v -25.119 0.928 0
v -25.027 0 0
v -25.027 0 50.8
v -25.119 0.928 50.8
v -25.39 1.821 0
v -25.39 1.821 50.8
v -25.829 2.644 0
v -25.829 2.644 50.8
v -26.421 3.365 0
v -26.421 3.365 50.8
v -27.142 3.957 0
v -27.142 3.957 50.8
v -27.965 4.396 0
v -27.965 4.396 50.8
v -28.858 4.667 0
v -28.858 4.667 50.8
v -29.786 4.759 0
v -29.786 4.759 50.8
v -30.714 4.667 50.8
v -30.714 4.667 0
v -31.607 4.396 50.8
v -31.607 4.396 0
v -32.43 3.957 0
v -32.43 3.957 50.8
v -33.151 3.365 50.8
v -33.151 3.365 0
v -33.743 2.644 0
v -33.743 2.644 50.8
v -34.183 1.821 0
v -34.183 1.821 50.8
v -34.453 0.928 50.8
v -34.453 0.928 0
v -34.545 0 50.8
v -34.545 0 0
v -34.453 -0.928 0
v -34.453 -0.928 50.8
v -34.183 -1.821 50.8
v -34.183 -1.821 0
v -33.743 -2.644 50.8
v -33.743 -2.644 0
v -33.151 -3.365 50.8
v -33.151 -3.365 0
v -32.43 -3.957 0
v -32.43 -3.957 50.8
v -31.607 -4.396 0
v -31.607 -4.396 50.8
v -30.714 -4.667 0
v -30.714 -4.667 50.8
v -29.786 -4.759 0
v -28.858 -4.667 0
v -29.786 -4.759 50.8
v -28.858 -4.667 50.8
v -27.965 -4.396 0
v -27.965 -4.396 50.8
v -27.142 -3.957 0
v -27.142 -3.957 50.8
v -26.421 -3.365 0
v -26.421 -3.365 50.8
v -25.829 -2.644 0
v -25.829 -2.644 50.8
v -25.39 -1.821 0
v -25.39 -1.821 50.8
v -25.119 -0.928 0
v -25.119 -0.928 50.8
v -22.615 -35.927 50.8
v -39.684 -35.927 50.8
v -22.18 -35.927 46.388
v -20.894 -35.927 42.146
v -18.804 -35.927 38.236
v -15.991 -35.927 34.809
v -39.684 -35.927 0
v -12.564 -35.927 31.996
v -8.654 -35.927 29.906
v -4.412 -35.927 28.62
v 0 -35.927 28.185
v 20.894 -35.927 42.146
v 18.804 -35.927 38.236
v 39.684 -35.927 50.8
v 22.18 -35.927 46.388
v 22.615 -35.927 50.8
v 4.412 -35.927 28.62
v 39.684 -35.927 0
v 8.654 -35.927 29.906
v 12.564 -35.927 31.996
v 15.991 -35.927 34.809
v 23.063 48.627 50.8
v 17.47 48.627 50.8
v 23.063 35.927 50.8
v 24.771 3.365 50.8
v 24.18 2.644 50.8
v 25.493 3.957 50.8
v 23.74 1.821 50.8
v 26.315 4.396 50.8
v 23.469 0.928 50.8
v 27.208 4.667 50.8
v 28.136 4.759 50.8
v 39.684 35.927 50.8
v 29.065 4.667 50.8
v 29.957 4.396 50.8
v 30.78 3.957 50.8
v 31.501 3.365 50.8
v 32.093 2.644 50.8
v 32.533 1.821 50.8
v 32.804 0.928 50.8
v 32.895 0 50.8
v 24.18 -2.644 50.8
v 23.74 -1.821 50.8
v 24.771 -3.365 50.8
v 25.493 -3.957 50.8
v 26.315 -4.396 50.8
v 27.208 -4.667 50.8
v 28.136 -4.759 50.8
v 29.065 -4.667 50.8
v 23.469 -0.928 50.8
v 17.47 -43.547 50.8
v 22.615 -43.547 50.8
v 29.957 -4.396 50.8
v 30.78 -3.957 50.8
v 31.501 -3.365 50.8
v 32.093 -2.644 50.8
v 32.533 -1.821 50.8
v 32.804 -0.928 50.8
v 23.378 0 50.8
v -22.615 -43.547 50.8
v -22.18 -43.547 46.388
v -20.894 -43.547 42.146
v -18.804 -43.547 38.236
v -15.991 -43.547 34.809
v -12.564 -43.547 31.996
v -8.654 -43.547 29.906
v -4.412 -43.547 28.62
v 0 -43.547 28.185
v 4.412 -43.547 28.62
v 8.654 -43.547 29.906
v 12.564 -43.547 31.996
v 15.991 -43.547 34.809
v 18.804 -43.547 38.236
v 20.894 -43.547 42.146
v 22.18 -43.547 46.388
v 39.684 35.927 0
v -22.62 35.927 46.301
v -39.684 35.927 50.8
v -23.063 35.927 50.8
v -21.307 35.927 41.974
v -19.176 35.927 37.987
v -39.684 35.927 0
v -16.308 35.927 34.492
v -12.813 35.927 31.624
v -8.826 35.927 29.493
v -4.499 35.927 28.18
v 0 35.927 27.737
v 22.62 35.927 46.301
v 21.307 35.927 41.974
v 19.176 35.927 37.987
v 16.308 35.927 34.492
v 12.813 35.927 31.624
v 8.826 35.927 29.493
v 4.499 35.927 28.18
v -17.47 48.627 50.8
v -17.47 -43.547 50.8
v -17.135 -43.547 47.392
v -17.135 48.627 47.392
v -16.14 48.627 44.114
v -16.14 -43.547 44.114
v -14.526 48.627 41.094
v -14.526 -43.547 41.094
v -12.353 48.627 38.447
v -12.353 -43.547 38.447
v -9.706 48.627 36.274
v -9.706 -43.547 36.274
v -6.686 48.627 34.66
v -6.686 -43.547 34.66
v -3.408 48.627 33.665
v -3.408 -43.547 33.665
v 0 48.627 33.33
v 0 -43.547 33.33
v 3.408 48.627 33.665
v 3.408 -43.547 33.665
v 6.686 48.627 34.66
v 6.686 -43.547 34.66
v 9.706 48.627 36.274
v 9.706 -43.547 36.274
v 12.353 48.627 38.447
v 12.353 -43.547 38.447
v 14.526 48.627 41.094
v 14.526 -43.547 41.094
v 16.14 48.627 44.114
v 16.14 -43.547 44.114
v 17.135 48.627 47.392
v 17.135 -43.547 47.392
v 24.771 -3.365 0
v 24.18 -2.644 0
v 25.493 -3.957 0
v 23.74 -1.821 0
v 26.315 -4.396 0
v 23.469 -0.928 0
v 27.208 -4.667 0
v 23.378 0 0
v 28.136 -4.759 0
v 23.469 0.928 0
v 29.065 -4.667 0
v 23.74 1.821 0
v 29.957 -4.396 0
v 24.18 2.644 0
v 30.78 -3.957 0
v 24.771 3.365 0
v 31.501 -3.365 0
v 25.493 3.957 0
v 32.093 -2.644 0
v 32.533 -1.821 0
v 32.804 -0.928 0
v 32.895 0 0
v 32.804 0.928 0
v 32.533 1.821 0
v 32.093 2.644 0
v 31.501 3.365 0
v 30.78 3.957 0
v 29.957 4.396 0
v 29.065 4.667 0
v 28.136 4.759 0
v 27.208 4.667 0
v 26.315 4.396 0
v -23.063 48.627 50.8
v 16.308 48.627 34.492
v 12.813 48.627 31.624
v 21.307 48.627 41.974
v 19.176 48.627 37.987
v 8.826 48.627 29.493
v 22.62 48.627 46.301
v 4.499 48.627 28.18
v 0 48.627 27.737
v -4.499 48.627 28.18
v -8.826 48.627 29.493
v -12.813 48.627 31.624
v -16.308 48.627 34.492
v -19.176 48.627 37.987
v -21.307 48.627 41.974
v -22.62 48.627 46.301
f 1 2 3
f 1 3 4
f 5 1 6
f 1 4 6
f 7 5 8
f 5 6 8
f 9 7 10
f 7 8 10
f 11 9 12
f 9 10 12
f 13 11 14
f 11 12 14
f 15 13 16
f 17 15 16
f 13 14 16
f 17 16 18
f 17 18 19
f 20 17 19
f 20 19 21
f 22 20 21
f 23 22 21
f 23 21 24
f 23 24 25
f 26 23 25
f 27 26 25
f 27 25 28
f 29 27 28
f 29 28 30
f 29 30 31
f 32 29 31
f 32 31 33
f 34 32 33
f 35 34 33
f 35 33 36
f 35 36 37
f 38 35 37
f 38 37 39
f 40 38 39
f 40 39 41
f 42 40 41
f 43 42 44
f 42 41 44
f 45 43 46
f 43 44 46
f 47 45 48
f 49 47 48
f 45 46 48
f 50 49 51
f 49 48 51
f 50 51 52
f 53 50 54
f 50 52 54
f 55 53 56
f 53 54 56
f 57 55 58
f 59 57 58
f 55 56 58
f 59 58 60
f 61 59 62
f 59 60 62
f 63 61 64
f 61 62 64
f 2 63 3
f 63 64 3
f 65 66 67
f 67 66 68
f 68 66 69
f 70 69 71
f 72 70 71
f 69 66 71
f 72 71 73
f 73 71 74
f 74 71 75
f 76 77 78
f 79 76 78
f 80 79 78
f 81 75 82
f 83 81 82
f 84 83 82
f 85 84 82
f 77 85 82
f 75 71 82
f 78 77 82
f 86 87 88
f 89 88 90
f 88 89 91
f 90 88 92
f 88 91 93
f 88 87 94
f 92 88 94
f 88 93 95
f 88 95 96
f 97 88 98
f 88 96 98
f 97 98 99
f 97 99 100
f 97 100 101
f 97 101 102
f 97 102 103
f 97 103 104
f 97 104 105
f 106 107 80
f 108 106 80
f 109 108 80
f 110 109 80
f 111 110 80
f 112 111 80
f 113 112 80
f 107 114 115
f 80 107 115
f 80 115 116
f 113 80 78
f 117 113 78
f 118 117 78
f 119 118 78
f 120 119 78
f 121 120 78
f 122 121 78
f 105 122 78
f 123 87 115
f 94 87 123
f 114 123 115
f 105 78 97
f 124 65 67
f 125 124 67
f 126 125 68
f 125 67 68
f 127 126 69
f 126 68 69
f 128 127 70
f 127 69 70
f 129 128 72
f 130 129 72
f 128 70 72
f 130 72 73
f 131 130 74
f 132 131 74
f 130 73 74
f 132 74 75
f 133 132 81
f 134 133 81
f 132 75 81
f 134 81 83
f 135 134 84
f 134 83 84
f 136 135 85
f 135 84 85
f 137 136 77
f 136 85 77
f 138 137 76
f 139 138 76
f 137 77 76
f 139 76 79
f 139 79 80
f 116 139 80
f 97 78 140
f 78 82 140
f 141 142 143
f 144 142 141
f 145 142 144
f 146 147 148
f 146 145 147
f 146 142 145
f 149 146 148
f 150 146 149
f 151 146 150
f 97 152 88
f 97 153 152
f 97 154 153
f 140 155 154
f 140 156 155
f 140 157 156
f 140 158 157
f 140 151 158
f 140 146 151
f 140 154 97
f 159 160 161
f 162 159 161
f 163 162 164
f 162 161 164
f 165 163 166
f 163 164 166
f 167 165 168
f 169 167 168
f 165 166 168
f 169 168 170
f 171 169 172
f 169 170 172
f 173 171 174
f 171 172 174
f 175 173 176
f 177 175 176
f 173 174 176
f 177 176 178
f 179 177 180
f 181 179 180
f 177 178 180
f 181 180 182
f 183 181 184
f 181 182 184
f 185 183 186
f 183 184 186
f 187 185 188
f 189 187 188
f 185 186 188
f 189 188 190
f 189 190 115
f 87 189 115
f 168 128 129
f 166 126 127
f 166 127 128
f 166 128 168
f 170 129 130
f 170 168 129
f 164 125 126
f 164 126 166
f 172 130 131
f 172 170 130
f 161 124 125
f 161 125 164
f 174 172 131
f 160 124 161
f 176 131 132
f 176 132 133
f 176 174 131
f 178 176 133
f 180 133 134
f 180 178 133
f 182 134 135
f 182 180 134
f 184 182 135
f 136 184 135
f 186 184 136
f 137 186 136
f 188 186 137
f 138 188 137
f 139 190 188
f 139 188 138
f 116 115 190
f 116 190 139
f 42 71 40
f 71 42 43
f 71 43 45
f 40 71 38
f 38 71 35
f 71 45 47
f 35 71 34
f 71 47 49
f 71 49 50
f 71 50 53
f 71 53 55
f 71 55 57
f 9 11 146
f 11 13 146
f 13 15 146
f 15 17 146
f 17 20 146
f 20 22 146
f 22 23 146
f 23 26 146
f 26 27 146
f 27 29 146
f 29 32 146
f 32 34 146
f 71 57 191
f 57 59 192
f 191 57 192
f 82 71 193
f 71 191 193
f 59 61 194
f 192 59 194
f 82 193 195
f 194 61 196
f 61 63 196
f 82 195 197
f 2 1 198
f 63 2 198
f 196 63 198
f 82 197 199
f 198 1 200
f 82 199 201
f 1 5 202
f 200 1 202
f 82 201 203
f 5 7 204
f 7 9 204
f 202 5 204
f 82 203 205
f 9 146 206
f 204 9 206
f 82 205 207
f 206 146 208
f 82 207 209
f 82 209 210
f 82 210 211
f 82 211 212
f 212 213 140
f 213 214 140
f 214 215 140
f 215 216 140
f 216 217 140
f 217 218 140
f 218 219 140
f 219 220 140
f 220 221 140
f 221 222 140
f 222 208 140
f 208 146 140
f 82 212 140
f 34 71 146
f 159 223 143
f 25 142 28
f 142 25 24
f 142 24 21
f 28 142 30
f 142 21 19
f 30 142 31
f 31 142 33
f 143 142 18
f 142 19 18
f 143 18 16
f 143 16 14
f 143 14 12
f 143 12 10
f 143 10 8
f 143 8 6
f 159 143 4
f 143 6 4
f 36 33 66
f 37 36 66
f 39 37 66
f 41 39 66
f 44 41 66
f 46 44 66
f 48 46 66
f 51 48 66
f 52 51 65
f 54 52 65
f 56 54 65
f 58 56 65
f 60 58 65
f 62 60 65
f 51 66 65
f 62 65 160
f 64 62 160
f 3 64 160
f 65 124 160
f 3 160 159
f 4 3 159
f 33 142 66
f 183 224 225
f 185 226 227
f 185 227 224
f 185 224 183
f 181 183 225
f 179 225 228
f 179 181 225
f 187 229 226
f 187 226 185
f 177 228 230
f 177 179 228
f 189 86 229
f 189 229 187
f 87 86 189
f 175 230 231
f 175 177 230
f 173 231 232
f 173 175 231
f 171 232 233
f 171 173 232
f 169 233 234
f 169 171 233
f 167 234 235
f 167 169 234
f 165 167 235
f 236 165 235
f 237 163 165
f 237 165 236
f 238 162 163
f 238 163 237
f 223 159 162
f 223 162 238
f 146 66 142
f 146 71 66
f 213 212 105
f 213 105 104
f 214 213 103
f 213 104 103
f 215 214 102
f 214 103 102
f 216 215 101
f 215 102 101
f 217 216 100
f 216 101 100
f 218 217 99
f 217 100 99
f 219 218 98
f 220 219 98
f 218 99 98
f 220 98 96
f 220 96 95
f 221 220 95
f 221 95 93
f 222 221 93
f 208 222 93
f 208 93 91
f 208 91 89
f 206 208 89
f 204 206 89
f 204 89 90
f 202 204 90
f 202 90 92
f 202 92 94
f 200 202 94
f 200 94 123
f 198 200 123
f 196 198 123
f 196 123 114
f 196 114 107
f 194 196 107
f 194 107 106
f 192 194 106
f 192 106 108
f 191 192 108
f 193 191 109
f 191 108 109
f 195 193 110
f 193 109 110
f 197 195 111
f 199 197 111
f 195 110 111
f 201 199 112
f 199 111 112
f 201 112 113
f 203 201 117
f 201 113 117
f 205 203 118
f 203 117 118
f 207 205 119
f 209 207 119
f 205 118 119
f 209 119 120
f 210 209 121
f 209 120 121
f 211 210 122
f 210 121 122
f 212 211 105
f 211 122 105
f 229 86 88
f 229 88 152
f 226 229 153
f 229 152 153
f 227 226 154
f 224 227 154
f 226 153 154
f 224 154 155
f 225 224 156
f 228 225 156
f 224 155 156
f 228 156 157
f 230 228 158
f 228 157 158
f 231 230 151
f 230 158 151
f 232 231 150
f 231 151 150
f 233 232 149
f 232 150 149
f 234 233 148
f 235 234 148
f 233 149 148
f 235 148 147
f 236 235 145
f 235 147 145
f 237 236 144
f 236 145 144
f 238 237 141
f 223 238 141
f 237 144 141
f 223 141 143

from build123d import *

# Parameters (mm, degrees)
F0_W      = 79.3684571981
F0_H      = 71.8531981111
F1_DEPTH  = 25.4
F2_DEPTH  = 25.4
F4_DEPTH  = 101.6
F5_R      = 4.7587178315
F6_DEPTH  = 127
F7_DEPTH  = 508
F9_DEPTH  = 7.62
F11_DEPTH = 25.4
F12_DEPTH = 12.7


with BuildPart() as f1:
    # F0 (on Top) → F1 (new body)
    with BuildSketch(Plane.XY):
        Rectangle(F0_W, F0_H)
    extrude(amount=F1_DEPTH)

    # F2 (add): a face of the model
    f2_faces = [f1.faces().sort_by_distance(p)[0] for p in [
        (0, 0, 25.4),
    ]]
    extrude(f2_faces, amount=F2_DEPTH)

    # F3 (on face) → F4 (cut)
    with BuildSketch(Plane.XZ.offset(35.9265990555)):
        with BuildLine():
            ThreePointArc((-17.4702548625, 50.8), (0, 33.3297451375), (17.4702548625, 50.8))
            Line((17.4702548625, 50.8), (-17.4702548625, 50.8))
        make_face()
    extrude(amount=-F4_DEPTH, mode=Mode.SUBTRACT)

    # F5 (on face) → F6 (join)
    with BuildSketch(Plane.XY.offset(50.8)):
        with Locations((-29.7860819846, 0)):
            Circle(F5_R)
        with Locations((28.1363911927, 0)):
            Circle(F5_R)
    extrude(amount=F6_DEPTH)

    # F7 (cut): faces of the model
    f7_faces = [f1.faces().sort_by_distance(p)[0] for p in [
        (28.1363911927, 0, 177.8),
        (-29.7860819846, 0, 177.8),
    ]]
    extrude(f7_faces, amount=-F7_DEPTH, mode=Mode.SUBTRACT)

    # F8 (on face) → F9 (join)
    with BuildSketch(Plane.XZ.offset(35.9265990555)):
        with BuildLine():
            Line((-17.4702548625, 50.8), (-22.6149617575, 50.8))
            ThreePointArc((-22.6149617575, 50.8), (0, 28.1850382425), (22.6149617575, 50.8))
            Line((22.6149617575, 50.8), (17.4702548625, 50.8))
            ThreePointArc((17.4702548625, 50.8), (0, 33.3297451375), (-17.4702548625, 50.8))
        make_face()
    extrude(amount=F9_DEPTH)

    # F10 (on face) → F11 (join)
    with BuildSketch(Plane(origin=(0, 35.9265990555, 0), x_dir=(-1, 0, 0), z_dir=(0, 1, 0))):
        with BuildLine():
            Line((-17.4702548625, 50.8), (-23.0630593563, 50.8))
            ThreePointArc((-23.0630593563, 50.8), (0, 27.7369406437), (23.0630593563, 50.8))
            Line((23.0630593563, 50.8), (17.4702548625, 50.8))
            ThreePointArc((17.4702548625, 50.8), (0, 33.3297451375), (-17.4702548625, 50.8))
        make_face()
    extrude(amount=F11_DEPTH)

    # F12 (cut): a face of the model
    f12_faces = [f1.faces().sort_by_distance(p)[0] for p in [
        (20.2666571094, 61.3265990555, 50.2842943151),
    ]]
    extrude(f12_faces, amount=-F12_DEPTH, mode=Mode.SUBTRACT)


solid = f1.part
